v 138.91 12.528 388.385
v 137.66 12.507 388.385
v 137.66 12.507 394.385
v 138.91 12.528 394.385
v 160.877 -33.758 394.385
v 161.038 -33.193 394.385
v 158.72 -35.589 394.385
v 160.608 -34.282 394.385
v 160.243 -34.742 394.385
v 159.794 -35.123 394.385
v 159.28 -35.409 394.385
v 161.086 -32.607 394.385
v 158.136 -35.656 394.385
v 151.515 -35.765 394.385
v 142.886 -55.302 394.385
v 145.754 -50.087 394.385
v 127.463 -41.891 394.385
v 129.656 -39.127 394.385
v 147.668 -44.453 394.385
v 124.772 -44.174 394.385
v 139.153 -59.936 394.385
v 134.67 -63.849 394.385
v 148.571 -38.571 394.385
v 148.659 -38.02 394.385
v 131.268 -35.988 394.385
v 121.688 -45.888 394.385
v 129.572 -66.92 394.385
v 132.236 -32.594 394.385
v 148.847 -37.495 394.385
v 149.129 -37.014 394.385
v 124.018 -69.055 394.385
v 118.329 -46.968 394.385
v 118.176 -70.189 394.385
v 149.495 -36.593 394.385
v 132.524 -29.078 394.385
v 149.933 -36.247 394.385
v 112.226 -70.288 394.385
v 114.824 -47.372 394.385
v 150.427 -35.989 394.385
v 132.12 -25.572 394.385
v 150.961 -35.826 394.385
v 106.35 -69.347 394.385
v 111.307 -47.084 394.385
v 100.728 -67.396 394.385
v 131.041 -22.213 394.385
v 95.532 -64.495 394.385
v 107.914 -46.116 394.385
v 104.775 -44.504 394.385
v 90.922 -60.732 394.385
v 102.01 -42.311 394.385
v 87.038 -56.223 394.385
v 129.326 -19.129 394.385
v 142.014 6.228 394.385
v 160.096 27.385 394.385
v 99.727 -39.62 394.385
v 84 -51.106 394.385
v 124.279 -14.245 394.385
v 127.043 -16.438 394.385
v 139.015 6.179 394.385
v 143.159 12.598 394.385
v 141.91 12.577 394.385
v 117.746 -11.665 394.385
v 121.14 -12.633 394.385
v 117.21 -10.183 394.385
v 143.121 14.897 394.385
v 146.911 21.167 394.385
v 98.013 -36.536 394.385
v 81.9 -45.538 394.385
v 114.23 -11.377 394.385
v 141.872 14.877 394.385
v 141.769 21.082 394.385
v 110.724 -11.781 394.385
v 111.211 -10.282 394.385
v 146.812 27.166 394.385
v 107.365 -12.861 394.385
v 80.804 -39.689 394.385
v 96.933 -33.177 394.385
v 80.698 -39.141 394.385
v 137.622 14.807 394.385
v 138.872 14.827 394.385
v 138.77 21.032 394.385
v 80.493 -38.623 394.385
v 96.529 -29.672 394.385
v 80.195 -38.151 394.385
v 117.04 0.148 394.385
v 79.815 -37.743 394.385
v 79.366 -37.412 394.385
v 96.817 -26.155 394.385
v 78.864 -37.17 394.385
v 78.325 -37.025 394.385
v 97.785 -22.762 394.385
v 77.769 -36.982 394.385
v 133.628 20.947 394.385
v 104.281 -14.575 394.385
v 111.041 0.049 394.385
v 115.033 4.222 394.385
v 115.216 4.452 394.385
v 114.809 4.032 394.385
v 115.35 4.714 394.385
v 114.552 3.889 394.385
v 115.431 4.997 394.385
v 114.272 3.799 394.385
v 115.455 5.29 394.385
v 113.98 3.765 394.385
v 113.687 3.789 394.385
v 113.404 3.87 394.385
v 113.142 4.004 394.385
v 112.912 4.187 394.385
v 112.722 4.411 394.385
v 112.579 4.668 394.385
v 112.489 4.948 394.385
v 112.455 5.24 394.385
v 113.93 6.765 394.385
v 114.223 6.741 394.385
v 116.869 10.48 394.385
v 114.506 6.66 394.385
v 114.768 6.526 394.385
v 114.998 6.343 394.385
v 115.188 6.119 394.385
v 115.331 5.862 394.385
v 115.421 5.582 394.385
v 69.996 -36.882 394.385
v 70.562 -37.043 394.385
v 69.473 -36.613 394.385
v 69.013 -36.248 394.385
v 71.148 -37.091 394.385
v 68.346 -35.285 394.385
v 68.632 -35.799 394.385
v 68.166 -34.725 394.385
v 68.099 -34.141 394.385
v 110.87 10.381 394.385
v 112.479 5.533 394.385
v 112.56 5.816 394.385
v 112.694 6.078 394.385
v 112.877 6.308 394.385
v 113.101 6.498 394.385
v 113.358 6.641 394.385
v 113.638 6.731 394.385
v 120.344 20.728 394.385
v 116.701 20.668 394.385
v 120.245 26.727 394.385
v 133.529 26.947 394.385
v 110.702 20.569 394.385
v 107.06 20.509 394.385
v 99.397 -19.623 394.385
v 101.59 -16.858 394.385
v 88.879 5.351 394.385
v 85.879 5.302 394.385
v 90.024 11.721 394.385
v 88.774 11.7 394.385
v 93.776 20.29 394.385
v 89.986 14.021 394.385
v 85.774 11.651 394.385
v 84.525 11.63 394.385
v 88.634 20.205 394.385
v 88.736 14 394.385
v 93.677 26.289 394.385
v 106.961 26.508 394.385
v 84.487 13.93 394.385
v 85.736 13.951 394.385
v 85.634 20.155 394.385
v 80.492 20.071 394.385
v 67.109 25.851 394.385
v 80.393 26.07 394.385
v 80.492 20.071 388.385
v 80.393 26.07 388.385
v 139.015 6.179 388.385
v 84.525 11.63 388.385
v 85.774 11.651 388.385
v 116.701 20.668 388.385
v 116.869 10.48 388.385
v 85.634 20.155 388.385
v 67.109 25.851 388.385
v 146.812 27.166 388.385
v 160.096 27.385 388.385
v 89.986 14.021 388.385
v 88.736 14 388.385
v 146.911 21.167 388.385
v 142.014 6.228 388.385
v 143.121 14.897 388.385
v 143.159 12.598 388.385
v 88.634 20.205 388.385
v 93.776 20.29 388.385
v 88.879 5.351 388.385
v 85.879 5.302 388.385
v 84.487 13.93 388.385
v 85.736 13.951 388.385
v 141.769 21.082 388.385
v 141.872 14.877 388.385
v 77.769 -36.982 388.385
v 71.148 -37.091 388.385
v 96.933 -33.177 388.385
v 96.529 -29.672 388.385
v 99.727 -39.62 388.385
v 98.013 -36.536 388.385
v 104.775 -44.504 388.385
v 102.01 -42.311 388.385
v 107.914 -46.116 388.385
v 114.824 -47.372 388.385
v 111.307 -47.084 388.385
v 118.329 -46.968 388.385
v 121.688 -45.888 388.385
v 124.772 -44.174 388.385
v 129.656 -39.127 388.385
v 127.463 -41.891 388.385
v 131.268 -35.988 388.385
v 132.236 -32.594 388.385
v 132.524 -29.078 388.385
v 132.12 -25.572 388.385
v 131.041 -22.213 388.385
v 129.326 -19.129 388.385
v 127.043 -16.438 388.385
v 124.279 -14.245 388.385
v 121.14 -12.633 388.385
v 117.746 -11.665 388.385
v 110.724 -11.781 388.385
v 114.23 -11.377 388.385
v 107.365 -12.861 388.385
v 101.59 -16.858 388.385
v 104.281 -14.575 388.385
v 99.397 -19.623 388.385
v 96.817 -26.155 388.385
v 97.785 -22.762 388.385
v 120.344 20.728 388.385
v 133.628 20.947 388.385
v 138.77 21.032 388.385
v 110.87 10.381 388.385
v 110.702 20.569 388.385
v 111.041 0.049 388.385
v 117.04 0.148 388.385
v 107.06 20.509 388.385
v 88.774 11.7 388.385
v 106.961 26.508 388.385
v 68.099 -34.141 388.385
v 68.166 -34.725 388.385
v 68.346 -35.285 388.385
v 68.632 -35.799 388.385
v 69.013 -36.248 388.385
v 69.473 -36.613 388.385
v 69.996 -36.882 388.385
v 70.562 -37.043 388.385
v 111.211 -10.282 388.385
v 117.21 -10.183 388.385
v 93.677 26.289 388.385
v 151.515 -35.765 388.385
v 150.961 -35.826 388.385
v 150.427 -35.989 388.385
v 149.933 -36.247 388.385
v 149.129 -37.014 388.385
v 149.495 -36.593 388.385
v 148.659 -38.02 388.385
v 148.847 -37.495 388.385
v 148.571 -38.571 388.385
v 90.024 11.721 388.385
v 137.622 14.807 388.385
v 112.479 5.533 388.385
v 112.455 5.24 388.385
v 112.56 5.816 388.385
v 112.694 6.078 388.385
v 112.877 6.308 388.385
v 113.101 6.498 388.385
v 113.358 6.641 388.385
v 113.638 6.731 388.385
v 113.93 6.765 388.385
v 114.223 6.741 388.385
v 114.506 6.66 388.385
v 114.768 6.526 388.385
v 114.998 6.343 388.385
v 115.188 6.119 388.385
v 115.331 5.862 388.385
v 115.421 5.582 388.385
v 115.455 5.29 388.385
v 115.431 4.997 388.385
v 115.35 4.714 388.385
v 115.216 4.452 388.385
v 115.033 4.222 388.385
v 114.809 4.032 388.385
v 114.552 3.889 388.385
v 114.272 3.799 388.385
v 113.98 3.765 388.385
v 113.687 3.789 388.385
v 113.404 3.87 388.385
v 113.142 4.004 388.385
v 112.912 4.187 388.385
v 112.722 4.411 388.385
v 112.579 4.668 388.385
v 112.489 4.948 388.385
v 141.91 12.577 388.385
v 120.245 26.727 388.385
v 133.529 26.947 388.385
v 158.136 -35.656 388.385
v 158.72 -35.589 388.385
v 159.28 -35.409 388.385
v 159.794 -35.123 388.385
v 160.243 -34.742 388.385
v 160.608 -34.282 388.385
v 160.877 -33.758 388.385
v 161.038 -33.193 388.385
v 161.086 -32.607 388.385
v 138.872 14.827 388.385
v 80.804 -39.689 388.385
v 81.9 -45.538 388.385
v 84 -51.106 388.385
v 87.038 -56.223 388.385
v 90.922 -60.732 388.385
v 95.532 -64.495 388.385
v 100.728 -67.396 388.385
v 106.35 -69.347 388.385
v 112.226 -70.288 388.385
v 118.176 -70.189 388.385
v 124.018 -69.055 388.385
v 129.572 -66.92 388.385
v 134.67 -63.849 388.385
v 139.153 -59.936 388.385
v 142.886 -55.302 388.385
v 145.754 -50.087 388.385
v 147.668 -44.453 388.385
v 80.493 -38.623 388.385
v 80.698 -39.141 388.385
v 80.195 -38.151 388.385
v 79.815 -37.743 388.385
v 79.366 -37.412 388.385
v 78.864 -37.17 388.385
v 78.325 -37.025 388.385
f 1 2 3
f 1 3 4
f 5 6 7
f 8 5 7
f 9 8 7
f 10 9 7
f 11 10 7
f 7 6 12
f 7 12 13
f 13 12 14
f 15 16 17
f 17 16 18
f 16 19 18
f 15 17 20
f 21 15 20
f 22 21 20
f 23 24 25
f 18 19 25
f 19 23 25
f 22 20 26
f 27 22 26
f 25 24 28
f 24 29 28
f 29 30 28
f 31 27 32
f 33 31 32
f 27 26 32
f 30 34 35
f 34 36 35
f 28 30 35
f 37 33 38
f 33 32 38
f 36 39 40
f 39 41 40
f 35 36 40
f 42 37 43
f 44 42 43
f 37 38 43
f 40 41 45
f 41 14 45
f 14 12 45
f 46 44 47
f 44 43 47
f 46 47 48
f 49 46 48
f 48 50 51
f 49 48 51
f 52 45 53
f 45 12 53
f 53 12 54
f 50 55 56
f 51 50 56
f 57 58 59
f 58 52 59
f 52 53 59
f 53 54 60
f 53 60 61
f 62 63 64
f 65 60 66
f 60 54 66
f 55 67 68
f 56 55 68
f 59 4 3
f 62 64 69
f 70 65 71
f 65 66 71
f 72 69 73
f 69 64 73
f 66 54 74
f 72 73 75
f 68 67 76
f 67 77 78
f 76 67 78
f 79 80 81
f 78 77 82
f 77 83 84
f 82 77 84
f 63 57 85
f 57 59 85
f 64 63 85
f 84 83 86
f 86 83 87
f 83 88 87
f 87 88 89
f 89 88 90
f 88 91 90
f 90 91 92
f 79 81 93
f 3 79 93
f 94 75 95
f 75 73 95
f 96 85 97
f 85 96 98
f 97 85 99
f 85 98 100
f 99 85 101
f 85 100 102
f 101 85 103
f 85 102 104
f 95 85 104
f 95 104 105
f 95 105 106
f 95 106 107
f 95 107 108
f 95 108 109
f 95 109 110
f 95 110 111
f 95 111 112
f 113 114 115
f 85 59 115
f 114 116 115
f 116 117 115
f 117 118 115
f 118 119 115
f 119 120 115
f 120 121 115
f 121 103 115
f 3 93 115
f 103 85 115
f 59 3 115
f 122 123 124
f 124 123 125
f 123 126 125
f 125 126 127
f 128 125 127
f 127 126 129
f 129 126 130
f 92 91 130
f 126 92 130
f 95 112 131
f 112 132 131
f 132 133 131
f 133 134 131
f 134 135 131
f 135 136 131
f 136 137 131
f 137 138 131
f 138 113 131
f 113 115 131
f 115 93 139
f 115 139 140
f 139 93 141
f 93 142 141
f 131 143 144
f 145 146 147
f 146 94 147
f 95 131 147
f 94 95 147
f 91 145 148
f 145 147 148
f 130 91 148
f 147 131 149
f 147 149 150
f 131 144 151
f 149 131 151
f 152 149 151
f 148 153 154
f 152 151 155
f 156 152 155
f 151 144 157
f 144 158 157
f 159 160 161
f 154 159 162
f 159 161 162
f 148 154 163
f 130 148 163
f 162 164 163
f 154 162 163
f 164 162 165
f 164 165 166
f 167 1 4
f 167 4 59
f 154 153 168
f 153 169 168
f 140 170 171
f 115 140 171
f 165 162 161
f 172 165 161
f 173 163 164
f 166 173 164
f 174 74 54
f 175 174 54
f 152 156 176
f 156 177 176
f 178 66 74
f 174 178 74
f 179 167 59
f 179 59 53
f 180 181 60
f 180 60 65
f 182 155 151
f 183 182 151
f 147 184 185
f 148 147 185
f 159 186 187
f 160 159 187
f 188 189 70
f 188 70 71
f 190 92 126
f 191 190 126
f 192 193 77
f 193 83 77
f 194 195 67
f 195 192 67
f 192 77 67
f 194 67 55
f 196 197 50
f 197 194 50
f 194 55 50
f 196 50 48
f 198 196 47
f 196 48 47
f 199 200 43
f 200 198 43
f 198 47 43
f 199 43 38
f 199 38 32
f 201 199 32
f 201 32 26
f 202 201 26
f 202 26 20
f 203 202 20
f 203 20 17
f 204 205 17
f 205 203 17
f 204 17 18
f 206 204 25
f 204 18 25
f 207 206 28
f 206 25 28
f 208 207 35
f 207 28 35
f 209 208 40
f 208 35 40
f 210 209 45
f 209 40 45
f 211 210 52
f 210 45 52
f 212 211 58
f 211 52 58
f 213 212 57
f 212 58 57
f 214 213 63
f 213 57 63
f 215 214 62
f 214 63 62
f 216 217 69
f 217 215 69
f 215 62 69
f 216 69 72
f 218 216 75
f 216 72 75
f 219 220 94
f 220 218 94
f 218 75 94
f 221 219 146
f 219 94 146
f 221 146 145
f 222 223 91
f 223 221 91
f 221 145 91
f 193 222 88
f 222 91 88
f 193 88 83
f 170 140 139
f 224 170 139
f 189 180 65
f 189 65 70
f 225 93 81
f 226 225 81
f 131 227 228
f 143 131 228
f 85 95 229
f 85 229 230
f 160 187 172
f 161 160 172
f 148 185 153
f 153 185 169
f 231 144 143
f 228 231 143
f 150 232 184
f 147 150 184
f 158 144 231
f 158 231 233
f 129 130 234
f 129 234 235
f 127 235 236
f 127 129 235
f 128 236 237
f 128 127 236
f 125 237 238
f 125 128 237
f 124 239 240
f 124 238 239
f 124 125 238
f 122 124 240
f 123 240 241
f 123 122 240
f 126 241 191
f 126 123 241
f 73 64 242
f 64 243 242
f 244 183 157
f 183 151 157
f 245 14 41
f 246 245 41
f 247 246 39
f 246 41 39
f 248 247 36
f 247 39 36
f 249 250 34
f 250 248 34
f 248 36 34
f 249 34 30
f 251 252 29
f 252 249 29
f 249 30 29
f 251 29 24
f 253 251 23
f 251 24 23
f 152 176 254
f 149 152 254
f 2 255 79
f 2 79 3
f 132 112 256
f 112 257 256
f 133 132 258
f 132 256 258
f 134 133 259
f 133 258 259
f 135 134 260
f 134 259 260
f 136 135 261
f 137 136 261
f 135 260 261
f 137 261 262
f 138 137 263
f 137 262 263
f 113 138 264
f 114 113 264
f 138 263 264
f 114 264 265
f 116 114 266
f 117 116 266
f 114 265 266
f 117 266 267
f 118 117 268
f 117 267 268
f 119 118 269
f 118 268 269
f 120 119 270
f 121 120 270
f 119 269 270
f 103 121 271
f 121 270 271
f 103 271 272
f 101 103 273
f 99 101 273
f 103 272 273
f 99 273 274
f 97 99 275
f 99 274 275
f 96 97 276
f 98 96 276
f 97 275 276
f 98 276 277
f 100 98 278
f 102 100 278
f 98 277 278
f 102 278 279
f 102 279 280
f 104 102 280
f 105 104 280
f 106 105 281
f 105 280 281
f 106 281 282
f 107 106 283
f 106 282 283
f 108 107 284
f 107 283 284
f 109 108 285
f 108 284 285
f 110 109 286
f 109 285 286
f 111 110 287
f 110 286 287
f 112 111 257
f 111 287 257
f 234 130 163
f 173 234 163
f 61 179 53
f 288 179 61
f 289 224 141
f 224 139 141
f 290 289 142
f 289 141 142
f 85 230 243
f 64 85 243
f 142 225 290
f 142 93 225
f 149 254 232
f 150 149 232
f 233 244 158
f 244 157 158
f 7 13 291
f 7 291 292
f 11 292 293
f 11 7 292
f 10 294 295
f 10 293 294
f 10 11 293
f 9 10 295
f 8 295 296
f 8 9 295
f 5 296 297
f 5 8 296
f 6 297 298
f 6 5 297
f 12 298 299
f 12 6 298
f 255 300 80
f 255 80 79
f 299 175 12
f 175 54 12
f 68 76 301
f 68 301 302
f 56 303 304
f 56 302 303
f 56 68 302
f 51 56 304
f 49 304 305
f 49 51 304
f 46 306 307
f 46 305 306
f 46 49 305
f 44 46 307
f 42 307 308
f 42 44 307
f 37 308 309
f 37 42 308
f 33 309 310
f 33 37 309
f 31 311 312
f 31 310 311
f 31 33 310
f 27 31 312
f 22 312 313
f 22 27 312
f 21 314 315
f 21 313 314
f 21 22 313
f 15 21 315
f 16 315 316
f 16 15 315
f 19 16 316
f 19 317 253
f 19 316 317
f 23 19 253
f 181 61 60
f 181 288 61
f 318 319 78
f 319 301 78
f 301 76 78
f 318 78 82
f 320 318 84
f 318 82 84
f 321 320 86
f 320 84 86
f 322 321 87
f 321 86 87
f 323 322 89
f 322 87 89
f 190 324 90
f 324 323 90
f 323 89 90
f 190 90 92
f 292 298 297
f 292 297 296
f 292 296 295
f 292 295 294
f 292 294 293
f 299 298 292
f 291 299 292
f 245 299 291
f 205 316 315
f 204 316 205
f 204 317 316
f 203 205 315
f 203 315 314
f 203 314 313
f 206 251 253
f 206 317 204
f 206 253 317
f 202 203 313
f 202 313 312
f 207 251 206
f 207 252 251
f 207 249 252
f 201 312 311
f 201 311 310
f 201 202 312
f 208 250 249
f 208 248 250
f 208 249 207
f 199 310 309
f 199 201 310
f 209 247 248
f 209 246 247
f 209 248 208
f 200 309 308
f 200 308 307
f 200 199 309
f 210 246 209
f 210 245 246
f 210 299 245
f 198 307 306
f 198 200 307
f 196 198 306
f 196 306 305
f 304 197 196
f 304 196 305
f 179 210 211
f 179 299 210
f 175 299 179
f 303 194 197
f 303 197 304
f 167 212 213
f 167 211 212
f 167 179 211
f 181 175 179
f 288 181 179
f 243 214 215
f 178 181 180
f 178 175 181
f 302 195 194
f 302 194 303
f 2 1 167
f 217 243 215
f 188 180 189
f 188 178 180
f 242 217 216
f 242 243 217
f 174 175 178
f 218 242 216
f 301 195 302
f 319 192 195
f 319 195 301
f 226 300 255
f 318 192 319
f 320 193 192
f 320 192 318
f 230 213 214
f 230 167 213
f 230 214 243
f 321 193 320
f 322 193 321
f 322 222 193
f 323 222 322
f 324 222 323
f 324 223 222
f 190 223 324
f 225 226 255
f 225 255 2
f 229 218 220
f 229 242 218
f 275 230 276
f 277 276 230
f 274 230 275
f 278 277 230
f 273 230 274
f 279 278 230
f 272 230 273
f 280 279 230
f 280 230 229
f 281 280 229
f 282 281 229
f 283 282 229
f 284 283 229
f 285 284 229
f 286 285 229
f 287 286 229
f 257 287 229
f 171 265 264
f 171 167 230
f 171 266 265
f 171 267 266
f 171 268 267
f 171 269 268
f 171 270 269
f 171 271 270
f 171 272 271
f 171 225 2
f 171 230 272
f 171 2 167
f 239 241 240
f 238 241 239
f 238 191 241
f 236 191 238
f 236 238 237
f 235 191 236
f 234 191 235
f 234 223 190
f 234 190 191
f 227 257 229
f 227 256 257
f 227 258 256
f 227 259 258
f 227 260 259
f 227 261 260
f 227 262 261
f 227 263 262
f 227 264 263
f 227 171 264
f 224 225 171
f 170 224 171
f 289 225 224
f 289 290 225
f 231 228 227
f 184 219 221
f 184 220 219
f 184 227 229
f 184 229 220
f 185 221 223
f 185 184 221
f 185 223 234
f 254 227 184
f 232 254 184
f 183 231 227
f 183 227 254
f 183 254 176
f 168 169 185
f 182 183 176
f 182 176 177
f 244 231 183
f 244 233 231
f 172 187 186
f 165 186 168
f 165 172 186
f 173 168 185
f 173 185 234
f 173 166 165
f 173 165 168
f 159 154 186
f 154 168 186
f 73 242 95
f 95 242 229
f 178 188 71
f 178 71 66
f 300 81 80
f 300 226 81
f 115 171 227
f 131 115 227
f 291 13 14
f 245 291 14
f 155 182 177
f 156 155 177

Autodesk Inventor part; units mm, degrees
ref_plane "YZ Plane" through (0, 0, 0) normal (1, 0, 0) x (0, 1, 0)
ref_plane "XZ Plane" through (0, 0, 0) normal (0, 1, 0) x (-1, 0, 0)
ref_plane "РабПлоскость1" through (67.2056, 19.9956, 394.3851) normal (0, 0, -1) x (-0.9999, -0.0165, 0)
sketch "Эскиз1" plane through (67.2056, 19.9956, 394.3851) normal (0, 0, -1) x (-0.9999, -0.0165, 0)
  line L0 (-9.6218, -57.1442) -> (-3, -57.1442) projected
  arc A0 (-9.6218, -57.1442) -> (-12.6119, -59.9009) centre (-9.6218, -60.1442) ccw projected
  arc A1 (-3, -57.1442) -> (0, -54.1442) centre (-3, -54.1442) ccw projected
  line L1 (0, -54.1442) -> (0, 5.8558) projected
  line L2 (0, 5.8558) -> (-13.2857, 5.8558) projected
  line L3 (-13.2857, -0.1442) -> (-13.2857, 5.8558) projected
  line L4 (-13.2857, -0.1442) -> (-26.5714, -0.1442)
  line L5 (-26.5714, -0.1442) -> (-26.5714, 5.8558)
  line L6 (-26.5714, 5.8558) -> (-39.8571, 5.8558) projected
  line L7 (-39.8571, -0.1442) -> (-39.8571, 5.8558) projected
  line L8 (-39.8571, -0.1442) -> (-53.1429, -0.1442)
  line L9 (-53.1429, -0.1442) -> (-53.1429, 5.8558)
  line L10 (-53.1429, 5.8558) -> (-66.4286, 5.8558) projected
  line L11 (-66.4286, -0.1442) -> (-66.4286, 5.8558) projected
  line L12 (-66.4286, -0.1442) -> (-79.7143, -0.1442)
  line L13 (-79.7143, -0.1442) -> (-79.7143, 5.8558)
  line L14 (-79.7143, 5.8558) -> (-93, 5.8558) projected
  line L15 (-93, 5.8558) -> (-93, -54.1442) projected
  arc A2 (-93, -54.1442) -> (-90, -57.1442) centre (-90, -54.1442) ccw projected
  line L16 (-90, -57.1442) -> (-83.3782, -57.1442) projected
  arc A3 (-80.3881, -59.9009) -> (-83.3782, -57.1442) centre (-83.3782, -60.1442) ccw projected
  arc A4 (-80.3881, -59.9009) -> (-12.6119, -59.9009) centre (-46.5, -57.1442) ccw projected
  circle A5 centre (-46.5, -50.1442) radius 18
  line L17 (-74.5714, -0.1442) -> (-79.7143, -0.1442) projected
  line L18 (-21.4286, -0.1442) -> (-26.5714, -0.1442) projected
  line L19 (-49.5, -0.1442) -> (-53.1429, -0.1442) projected
  circle A6 centre (-46.5, -50.1442) radius 18 construction
  point P0 (67.5262, -18.8845)
  dimension "d0" = 6
extrude "Выдавливание1" add sketch "Эскиз1" along normal blind 6
sketch "Эскиз2" plane through (67.2056, 19.9956, 388.3851) normal (0, 0, -1) x (-0.9999, -0.0165, 0)
  circle A0 centre (-46.5, -15.5) radius 1.5 projected
  line L0 (-49.5, -10.3334) -> (-49.5, -0.1442) construction
  line L1 (-43.5, -0.1442) -> (-43.5, -10.3334) construction
  line L2 (-43.5, -20.6667) -> (-43.5, -31) construction
  line L3 (-49.5, -31) -> (-49.5, -20.6667) construction
  line L4 (-49.5, -31) -> (-43.5, -31)
  line L5 (-43.5, -31) -> (-43.5, -20.6667)
  line L6 (-43.5, -20.6667) -> (-49.5, -20.6667)
  line L7 (-49.5, -20.6667) -> (-49.5, -31)
  line L8 (-49.5, -10.3334) -> (-43.5, -10.3334)
  line L9 (-43.5, -10.3334) -> (-43.5, -0.1442)
  line L10 (-43.5, -0.1442) -> (-49.5, -0.1442)
  line L11 (-49.5, -0.1442) -> (-49.5, -10.3334)
  line L12 (-17.1786, -8.65) -> (-17.1786, -6.35)
  line L13 (-17.1786, -6.35) -> (-18.4286, -6.35)
  line L14 (-18.4286, -6.35) -> (-18.4286, -0.1442)
  line L15 (-21.4286, -0.1442) -> (-21.4286, -6.35)
  line L16 (-21.4286, -6.35) -> (-22.6786, -6.35)
  line L17 (-22.6786, -6.35) -> (-22.6786, -8.65)
  line L18 (-22.6786, -8.65) -> (-21.4286, -8.65)
  line L19 (-21.4286, -8.65) -> (-21.4286, -15)
  line L20 (-21.4286, -15) -> (-18.4286, -15)
  line L21 (-18.4286, -15) -> (-18.4286, -8.65)
  line L22 (-18.4286, -8.65) -> (-17.1786, -8.65)
  line L23 (-21.4286, -0.1442) -> (-18.4286, -0.1442)
  line L24 (-46.5, -10.3334) -> (-46.5, -0.1442) construction
  line L25 (-75.8214, -8.65) -> (-75.8214, -6.35)
  line L26 (-75.8214, -6.35) -> (-74.5714, -6.35)
  line L27 (-74.5714, -6.35) -> (-74.5714, -0.1442)
  line L28 (-71.5714, -0.1442) -> (-71.5714, -6.35)
  line L29 (-71.5714, -6.35) -> (-70.3214, -6.35)
  line L30 (-70.3214, -6.35) -> (-70.3214, -8.65)
  line L31 (-70.3214, -8.65) -> (-71.5714, -8.65)
  line L32 (-71.5714, -8.65) -> (-71.5714, -15)
  line L33 (-71.5714, -15) -> (-74.5714, -15)
  line L34 (-74.5714, -15) -> (-74.5714, -8.65)
  line L35 (-74.5714, -8.65) -> (-75.8214, -8.65)
  line L36 (-71.5714, -0.1442) -> (-74.5714, -0.1442)
  point P0 (67.5262, -18.8845)
extrude "Выдавливание2" cut sketch "Эскиз2" against normal blind 6
equation "\"d1\" = d0"
equation "\"d3\" = d0"
properties part number "motor2"
